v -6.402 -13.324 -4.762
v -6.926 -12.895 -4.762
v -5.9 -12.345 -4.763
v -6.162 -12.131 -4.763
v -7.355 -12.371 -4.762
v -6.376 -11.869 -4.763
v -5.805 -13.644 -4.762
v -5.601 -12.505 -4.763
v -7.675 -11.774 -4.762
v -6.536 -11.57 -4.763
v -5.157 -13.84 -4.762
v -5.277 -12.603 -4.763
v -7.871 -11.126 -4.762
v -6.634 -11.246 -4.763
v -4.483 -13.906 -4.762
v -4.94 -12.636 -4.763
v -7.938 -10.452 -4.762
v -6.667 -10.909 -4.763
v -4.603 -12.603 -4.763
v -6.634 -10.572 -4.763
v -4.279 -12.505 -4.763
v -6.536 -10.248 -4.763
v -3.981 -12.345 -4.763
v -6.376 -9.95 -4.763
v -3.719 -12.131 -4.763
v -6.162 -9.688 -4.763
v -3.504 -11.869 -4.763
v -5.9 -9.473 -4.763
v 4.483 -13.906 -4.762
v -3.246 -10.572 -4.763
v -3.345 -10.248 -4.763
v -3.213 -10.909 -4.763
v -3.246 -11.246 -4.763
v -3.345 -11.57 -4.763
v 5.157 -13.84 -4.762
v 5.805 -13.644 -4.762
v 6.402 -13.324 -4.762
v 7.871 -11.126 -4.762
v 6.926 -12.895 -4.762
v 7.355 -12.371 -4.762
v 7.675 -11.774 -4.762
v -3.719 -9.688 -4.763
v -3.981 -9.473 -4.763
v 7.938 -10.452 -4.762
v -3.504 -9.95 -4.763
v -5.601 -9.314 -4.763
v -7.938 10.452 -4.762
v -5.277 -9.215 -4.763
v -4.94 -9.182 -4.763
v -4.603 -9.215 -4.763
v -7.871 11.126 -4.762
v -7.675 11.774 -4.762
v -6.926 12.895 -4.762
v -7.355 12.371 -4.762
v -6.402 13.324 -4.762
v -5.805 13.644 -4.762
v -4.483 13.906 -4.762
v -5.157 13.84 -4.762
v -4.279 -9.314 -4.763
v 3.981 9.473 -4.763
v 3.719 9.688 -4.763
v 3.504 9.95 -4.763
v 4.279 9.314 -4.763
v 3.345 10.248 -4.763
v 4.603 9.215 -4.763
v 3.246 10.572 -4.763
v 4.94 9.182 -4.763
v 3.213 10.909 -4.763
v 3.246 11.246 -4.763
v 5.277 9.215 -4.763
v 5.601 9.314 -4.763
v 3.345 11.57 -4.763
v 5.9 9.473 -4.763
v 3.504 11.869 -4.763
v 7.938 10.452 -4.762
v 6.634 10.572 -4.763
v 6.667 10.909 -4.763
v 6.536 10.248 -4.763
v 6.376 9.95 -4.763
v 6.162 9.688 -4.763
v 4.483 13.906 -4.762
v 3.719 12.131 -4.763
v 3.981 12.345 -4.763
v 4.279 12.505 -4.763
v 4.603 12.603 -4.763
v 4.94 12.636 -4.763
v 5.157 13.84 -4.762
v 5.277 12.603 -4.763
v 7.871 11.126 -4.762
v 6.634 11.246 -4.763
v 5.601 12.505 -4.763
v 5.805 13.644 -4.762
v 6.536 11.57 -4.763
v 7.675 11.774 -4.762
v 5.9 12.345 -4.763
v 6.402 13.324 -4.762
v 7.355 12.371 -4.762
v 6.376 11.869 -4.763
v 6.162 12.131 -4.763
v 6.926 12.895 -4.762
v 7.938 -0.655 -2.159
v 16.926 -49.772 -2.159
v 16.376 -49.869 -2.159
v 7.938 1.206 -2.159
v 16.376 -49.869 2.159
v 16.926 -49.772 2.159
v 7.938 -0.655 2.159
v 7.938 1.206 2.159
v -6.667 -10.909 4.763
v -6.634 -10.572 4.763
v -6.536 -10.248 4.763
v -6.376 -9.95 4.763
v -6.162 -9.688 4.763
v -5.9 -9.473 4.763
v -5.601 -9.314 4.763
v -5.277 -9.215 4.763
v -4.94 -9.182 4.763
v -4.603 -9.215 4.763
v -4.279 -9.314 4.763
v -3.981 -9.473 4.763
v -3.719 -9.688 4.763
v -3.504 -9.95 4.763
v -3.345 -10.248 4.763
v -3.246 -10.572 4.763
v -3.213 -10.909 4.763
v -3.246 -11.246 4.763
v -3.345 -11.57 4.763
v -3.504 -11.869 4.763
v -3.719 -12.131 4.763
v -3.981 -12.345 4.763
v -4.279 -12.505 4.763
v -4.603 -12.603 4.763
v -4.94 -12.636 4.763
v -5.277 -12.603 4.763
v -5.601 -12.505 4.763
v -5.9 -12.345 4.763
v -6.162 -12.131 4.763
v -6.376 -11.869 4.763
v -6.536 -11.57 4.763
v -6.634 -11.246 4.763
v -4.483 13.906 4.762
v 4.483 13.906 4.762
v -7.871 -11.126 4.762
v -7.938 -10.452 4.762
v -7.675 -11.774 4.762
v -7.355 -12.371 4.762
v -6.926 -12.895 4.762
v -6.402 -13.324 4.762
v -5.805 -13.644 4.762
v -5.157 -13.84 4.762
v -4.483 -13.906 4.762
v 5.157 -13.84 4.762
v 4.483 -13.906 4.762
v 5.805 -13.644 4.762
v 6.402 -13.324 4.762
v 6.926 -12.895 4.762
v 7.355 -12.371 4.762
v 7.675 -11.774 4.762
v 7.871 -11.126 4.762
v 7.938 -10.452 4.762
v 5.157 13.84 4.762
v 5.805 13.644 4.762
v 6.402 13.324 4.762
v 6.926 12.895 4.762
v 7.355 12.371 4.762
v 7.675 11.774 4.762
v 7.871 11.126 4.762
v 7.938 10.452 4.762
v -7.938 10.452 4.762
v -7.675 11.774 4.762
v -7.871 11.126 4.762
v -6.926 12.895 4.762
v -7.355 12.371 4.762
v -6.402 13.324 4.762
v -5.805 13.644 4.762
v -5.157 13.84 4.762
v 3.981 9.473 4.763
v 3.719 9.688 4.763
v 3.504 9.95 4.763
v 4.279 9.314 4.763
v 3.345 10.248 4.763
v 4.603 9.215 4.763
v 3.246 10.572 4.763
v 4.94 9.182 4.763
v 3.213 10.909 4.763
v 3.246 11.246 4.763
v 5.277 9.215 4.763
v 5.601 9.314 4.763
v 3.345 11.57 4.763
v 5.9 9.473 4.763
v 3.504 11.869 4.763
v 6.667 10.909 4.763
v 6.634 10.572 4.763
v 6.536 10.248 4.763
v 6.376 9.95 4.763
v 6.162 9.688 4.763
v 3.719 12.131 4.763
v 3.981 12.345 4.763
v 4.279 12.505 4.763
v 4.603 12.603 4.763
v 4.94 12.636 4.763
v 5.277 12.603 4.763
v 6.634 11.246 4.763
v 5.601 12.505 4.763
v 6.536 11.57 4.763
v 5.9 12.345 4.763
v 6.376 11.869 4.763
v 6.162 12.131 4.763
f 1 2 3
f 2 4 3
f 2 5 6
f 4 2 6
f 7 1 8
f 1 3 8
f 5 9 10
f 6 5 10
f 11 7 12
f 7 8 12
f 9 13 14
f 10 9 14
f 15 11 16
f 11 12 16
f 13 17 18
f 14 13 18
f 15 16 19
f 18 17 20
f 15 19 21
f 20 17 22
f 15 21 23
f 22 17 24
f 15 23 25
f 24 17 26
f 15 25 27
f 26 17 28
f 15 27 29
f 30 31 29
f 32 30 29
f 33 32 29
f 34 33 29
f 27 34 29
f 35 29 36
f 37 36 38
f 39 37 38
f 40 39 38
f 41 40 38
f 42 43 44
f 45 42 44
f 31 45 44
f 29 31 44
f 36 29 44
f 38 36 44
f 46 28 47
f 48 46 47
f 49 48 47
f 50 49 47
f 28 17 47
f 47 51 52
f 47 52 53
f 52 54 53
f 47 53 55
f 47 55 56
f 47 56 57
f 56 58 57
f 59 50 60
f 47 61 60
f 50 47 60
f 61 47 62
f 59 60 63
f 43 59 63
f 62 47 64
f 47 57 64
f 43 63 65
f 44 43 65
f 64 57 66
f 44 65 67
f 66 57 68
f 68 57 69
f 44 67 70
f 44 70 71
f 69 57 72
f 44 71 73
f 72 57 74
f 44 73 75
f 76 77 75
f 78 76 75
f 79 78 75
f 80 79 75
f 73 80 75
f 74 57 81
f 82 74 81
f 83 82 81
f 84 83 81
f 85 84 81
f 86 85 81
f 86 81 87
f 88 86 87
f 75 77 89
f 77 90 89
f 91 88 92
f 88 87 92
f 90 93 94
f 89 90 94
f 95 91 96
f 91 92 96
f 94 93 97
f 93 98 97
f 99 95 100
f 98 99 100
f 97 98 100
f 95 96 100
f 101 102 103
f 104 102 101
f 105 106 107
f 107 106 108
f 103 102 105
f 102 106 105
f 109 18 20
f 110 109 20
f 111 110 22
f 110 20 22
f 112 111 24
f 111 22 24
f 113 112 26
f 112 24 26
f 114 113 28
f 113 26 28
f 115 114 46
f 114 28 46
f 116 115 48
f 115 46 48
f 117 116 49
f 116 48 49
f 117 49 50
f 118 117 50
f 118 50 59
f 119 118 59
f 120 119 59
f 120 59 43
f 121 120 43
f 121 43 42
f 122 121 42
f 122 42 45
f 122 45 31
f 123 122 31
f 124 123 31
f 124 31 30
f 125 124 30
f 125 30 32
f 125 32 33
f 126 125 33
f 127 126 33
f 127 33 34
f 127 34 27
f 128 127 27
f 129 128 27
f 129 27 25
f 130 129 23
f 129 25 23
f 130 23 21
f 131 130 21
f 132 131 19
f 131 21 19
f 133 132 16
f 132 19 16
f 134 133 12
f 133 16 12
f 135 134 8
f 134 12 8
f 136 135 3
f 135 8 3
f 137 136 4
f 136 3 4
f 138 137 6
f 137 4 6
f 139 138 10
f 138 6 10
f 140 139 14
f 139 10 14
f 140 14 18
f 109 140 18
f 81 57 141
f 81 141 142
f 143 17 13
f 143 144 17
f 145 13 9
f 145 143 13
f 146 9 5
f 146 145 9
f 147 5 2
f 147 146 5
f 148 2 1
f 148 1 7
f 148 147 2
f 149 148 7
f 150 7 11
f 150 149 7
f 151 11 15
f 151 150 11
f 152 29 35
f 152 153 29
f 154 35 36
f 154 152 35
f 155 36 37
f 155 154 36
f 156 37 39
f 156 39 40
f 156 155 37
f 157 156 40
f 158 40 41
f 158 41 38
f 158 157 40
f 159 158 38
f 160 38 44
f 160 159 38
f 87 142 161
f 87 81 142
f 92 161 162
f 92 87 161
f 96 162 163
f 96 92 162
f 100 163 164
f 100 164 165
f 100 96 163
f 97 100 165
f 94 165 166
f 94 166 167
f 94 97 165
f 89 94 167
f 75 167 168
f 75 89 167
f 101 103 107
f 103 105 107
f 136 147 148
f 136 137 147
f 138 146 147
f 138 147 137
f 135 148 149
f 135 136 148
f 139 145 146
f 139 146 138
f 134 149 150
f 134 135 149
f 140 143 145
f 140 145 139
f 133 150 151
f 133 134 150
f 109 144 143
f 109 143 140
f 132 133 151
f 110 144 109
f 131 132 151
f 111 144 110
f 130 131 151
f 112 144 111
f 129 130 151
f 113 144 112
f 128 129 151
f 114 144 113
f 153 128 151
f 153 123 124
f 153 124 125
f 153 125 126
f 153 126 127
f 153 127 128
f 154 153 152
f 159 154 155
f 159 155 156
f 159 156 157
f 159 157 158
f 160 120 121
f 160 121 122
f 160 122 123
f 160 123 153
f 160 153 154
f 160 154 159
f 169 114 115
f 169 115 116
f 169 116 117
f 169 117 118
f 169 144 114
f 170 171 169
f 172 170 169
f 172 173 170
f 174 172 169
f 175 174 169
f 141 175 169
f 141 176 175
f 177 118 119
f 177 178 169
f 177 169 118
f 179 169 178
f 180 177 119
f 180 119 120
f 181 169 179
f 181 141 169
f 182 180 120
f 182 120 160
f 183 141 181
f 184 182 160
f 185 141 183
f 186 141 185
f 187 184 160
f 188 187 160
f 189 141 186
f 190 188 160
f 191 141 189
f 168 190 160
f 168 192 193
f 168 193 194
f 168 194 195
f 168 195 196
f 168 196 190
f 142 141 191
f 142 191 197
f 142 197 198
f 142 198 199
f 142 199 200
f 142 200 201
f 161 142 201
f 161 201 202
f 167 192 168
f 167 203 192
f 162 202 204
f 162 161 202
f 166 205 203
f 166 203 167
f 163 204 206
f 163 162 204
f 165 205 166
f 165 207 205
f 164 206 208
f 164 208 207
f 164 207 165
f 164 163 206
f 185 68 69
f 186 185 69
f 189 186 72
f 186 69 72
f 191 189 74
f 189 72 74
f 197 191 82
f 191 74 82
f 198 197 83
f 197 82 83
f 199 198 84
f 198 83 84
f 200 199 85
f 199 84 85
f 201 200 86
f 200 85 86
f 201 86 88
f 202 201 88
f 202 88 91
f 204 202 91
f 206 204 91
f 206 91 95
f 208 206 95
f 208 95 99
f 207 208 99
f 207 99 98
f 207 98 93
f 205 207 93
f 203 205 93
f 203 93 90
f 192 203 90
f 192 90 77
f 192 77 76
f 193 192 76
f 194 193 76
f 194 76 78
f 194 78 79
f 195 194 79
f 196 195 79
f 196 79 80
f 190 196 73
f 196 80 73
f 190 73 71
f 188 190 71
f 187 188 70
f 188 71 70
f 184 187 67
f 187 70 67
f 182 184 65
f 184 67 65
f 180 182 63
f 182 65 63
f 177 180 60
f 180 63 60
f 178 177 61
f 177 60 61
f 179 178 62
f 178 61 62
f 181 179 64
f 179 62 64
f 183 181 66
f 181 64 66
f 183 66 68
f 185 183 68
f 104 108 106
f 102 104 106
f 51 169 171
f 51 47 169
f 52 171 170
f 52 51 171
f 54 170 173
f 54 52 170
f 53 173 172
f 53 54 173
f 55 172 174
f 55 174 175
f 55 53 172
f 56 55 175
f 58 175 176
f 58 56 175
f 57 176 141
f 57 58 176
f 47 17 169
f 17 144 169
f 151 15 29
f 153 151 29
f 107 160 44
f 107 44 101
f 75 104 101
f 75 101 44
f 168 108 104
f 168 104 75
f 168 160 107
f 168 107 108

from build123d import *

# Parameters (mm, degrees)
SKETCH1_W                   = 15.875
SKETCH1_H                   = 27.813
BOSS_EXTRUDE1_DEPTH         = 4.7625
BOSS_EXTRUDE2_DEPTH         = 2.159
F_29_0_136_DIAMETER_HOLE1_D = 3.4544
FILLET1_R                   = 3.4544


with BuildPart() as part:
    # Sketch1 → Boss-Extrude1 (new, symmetric)
    with BuildSketch(Plane.XY):
        Rectangle(SKETCH1_W, SKETCH1_H)
    extrude(amount=BOSS_EXTRUDE1_DEPTH, both=True)

    # Sketch2 → Boss-Extrude2 (add, symmetric)
    with BuildSketch(Plane.XY):
        Polygon((7.9375, 1.2065), (16.926432647, -49.772270296), (16.376122074, -49.869304898), (7.9375, -0.655026961), align=None)
    extrude(amount=BOSS_EXTRUDE2_DEPTH, both=True)

    # #29 (0.136) Diameter Hole1 (through all)
    with Locations(Plane.XY.offset(4.7625)):
        with Locations((-4.9403, -10.9093), (4.9403, 10.9093)):
            Hole(F_29_0_136_DIAMETER_HOLE1_D / 2)

    # Fillet1
    fillet1_edges = [part.edges().sort_by_distance(p)[0] for p in [
        (-7.9375, -13.9065, 0),
        (7.9375, -13.9065, 0),
        (7.9375, 13.9065, 0),
        (-7.9375, 13.9065, 0),
    ]]
    fillet(fillet1_edges, radius=FILLET1_R)


solid = part.part
